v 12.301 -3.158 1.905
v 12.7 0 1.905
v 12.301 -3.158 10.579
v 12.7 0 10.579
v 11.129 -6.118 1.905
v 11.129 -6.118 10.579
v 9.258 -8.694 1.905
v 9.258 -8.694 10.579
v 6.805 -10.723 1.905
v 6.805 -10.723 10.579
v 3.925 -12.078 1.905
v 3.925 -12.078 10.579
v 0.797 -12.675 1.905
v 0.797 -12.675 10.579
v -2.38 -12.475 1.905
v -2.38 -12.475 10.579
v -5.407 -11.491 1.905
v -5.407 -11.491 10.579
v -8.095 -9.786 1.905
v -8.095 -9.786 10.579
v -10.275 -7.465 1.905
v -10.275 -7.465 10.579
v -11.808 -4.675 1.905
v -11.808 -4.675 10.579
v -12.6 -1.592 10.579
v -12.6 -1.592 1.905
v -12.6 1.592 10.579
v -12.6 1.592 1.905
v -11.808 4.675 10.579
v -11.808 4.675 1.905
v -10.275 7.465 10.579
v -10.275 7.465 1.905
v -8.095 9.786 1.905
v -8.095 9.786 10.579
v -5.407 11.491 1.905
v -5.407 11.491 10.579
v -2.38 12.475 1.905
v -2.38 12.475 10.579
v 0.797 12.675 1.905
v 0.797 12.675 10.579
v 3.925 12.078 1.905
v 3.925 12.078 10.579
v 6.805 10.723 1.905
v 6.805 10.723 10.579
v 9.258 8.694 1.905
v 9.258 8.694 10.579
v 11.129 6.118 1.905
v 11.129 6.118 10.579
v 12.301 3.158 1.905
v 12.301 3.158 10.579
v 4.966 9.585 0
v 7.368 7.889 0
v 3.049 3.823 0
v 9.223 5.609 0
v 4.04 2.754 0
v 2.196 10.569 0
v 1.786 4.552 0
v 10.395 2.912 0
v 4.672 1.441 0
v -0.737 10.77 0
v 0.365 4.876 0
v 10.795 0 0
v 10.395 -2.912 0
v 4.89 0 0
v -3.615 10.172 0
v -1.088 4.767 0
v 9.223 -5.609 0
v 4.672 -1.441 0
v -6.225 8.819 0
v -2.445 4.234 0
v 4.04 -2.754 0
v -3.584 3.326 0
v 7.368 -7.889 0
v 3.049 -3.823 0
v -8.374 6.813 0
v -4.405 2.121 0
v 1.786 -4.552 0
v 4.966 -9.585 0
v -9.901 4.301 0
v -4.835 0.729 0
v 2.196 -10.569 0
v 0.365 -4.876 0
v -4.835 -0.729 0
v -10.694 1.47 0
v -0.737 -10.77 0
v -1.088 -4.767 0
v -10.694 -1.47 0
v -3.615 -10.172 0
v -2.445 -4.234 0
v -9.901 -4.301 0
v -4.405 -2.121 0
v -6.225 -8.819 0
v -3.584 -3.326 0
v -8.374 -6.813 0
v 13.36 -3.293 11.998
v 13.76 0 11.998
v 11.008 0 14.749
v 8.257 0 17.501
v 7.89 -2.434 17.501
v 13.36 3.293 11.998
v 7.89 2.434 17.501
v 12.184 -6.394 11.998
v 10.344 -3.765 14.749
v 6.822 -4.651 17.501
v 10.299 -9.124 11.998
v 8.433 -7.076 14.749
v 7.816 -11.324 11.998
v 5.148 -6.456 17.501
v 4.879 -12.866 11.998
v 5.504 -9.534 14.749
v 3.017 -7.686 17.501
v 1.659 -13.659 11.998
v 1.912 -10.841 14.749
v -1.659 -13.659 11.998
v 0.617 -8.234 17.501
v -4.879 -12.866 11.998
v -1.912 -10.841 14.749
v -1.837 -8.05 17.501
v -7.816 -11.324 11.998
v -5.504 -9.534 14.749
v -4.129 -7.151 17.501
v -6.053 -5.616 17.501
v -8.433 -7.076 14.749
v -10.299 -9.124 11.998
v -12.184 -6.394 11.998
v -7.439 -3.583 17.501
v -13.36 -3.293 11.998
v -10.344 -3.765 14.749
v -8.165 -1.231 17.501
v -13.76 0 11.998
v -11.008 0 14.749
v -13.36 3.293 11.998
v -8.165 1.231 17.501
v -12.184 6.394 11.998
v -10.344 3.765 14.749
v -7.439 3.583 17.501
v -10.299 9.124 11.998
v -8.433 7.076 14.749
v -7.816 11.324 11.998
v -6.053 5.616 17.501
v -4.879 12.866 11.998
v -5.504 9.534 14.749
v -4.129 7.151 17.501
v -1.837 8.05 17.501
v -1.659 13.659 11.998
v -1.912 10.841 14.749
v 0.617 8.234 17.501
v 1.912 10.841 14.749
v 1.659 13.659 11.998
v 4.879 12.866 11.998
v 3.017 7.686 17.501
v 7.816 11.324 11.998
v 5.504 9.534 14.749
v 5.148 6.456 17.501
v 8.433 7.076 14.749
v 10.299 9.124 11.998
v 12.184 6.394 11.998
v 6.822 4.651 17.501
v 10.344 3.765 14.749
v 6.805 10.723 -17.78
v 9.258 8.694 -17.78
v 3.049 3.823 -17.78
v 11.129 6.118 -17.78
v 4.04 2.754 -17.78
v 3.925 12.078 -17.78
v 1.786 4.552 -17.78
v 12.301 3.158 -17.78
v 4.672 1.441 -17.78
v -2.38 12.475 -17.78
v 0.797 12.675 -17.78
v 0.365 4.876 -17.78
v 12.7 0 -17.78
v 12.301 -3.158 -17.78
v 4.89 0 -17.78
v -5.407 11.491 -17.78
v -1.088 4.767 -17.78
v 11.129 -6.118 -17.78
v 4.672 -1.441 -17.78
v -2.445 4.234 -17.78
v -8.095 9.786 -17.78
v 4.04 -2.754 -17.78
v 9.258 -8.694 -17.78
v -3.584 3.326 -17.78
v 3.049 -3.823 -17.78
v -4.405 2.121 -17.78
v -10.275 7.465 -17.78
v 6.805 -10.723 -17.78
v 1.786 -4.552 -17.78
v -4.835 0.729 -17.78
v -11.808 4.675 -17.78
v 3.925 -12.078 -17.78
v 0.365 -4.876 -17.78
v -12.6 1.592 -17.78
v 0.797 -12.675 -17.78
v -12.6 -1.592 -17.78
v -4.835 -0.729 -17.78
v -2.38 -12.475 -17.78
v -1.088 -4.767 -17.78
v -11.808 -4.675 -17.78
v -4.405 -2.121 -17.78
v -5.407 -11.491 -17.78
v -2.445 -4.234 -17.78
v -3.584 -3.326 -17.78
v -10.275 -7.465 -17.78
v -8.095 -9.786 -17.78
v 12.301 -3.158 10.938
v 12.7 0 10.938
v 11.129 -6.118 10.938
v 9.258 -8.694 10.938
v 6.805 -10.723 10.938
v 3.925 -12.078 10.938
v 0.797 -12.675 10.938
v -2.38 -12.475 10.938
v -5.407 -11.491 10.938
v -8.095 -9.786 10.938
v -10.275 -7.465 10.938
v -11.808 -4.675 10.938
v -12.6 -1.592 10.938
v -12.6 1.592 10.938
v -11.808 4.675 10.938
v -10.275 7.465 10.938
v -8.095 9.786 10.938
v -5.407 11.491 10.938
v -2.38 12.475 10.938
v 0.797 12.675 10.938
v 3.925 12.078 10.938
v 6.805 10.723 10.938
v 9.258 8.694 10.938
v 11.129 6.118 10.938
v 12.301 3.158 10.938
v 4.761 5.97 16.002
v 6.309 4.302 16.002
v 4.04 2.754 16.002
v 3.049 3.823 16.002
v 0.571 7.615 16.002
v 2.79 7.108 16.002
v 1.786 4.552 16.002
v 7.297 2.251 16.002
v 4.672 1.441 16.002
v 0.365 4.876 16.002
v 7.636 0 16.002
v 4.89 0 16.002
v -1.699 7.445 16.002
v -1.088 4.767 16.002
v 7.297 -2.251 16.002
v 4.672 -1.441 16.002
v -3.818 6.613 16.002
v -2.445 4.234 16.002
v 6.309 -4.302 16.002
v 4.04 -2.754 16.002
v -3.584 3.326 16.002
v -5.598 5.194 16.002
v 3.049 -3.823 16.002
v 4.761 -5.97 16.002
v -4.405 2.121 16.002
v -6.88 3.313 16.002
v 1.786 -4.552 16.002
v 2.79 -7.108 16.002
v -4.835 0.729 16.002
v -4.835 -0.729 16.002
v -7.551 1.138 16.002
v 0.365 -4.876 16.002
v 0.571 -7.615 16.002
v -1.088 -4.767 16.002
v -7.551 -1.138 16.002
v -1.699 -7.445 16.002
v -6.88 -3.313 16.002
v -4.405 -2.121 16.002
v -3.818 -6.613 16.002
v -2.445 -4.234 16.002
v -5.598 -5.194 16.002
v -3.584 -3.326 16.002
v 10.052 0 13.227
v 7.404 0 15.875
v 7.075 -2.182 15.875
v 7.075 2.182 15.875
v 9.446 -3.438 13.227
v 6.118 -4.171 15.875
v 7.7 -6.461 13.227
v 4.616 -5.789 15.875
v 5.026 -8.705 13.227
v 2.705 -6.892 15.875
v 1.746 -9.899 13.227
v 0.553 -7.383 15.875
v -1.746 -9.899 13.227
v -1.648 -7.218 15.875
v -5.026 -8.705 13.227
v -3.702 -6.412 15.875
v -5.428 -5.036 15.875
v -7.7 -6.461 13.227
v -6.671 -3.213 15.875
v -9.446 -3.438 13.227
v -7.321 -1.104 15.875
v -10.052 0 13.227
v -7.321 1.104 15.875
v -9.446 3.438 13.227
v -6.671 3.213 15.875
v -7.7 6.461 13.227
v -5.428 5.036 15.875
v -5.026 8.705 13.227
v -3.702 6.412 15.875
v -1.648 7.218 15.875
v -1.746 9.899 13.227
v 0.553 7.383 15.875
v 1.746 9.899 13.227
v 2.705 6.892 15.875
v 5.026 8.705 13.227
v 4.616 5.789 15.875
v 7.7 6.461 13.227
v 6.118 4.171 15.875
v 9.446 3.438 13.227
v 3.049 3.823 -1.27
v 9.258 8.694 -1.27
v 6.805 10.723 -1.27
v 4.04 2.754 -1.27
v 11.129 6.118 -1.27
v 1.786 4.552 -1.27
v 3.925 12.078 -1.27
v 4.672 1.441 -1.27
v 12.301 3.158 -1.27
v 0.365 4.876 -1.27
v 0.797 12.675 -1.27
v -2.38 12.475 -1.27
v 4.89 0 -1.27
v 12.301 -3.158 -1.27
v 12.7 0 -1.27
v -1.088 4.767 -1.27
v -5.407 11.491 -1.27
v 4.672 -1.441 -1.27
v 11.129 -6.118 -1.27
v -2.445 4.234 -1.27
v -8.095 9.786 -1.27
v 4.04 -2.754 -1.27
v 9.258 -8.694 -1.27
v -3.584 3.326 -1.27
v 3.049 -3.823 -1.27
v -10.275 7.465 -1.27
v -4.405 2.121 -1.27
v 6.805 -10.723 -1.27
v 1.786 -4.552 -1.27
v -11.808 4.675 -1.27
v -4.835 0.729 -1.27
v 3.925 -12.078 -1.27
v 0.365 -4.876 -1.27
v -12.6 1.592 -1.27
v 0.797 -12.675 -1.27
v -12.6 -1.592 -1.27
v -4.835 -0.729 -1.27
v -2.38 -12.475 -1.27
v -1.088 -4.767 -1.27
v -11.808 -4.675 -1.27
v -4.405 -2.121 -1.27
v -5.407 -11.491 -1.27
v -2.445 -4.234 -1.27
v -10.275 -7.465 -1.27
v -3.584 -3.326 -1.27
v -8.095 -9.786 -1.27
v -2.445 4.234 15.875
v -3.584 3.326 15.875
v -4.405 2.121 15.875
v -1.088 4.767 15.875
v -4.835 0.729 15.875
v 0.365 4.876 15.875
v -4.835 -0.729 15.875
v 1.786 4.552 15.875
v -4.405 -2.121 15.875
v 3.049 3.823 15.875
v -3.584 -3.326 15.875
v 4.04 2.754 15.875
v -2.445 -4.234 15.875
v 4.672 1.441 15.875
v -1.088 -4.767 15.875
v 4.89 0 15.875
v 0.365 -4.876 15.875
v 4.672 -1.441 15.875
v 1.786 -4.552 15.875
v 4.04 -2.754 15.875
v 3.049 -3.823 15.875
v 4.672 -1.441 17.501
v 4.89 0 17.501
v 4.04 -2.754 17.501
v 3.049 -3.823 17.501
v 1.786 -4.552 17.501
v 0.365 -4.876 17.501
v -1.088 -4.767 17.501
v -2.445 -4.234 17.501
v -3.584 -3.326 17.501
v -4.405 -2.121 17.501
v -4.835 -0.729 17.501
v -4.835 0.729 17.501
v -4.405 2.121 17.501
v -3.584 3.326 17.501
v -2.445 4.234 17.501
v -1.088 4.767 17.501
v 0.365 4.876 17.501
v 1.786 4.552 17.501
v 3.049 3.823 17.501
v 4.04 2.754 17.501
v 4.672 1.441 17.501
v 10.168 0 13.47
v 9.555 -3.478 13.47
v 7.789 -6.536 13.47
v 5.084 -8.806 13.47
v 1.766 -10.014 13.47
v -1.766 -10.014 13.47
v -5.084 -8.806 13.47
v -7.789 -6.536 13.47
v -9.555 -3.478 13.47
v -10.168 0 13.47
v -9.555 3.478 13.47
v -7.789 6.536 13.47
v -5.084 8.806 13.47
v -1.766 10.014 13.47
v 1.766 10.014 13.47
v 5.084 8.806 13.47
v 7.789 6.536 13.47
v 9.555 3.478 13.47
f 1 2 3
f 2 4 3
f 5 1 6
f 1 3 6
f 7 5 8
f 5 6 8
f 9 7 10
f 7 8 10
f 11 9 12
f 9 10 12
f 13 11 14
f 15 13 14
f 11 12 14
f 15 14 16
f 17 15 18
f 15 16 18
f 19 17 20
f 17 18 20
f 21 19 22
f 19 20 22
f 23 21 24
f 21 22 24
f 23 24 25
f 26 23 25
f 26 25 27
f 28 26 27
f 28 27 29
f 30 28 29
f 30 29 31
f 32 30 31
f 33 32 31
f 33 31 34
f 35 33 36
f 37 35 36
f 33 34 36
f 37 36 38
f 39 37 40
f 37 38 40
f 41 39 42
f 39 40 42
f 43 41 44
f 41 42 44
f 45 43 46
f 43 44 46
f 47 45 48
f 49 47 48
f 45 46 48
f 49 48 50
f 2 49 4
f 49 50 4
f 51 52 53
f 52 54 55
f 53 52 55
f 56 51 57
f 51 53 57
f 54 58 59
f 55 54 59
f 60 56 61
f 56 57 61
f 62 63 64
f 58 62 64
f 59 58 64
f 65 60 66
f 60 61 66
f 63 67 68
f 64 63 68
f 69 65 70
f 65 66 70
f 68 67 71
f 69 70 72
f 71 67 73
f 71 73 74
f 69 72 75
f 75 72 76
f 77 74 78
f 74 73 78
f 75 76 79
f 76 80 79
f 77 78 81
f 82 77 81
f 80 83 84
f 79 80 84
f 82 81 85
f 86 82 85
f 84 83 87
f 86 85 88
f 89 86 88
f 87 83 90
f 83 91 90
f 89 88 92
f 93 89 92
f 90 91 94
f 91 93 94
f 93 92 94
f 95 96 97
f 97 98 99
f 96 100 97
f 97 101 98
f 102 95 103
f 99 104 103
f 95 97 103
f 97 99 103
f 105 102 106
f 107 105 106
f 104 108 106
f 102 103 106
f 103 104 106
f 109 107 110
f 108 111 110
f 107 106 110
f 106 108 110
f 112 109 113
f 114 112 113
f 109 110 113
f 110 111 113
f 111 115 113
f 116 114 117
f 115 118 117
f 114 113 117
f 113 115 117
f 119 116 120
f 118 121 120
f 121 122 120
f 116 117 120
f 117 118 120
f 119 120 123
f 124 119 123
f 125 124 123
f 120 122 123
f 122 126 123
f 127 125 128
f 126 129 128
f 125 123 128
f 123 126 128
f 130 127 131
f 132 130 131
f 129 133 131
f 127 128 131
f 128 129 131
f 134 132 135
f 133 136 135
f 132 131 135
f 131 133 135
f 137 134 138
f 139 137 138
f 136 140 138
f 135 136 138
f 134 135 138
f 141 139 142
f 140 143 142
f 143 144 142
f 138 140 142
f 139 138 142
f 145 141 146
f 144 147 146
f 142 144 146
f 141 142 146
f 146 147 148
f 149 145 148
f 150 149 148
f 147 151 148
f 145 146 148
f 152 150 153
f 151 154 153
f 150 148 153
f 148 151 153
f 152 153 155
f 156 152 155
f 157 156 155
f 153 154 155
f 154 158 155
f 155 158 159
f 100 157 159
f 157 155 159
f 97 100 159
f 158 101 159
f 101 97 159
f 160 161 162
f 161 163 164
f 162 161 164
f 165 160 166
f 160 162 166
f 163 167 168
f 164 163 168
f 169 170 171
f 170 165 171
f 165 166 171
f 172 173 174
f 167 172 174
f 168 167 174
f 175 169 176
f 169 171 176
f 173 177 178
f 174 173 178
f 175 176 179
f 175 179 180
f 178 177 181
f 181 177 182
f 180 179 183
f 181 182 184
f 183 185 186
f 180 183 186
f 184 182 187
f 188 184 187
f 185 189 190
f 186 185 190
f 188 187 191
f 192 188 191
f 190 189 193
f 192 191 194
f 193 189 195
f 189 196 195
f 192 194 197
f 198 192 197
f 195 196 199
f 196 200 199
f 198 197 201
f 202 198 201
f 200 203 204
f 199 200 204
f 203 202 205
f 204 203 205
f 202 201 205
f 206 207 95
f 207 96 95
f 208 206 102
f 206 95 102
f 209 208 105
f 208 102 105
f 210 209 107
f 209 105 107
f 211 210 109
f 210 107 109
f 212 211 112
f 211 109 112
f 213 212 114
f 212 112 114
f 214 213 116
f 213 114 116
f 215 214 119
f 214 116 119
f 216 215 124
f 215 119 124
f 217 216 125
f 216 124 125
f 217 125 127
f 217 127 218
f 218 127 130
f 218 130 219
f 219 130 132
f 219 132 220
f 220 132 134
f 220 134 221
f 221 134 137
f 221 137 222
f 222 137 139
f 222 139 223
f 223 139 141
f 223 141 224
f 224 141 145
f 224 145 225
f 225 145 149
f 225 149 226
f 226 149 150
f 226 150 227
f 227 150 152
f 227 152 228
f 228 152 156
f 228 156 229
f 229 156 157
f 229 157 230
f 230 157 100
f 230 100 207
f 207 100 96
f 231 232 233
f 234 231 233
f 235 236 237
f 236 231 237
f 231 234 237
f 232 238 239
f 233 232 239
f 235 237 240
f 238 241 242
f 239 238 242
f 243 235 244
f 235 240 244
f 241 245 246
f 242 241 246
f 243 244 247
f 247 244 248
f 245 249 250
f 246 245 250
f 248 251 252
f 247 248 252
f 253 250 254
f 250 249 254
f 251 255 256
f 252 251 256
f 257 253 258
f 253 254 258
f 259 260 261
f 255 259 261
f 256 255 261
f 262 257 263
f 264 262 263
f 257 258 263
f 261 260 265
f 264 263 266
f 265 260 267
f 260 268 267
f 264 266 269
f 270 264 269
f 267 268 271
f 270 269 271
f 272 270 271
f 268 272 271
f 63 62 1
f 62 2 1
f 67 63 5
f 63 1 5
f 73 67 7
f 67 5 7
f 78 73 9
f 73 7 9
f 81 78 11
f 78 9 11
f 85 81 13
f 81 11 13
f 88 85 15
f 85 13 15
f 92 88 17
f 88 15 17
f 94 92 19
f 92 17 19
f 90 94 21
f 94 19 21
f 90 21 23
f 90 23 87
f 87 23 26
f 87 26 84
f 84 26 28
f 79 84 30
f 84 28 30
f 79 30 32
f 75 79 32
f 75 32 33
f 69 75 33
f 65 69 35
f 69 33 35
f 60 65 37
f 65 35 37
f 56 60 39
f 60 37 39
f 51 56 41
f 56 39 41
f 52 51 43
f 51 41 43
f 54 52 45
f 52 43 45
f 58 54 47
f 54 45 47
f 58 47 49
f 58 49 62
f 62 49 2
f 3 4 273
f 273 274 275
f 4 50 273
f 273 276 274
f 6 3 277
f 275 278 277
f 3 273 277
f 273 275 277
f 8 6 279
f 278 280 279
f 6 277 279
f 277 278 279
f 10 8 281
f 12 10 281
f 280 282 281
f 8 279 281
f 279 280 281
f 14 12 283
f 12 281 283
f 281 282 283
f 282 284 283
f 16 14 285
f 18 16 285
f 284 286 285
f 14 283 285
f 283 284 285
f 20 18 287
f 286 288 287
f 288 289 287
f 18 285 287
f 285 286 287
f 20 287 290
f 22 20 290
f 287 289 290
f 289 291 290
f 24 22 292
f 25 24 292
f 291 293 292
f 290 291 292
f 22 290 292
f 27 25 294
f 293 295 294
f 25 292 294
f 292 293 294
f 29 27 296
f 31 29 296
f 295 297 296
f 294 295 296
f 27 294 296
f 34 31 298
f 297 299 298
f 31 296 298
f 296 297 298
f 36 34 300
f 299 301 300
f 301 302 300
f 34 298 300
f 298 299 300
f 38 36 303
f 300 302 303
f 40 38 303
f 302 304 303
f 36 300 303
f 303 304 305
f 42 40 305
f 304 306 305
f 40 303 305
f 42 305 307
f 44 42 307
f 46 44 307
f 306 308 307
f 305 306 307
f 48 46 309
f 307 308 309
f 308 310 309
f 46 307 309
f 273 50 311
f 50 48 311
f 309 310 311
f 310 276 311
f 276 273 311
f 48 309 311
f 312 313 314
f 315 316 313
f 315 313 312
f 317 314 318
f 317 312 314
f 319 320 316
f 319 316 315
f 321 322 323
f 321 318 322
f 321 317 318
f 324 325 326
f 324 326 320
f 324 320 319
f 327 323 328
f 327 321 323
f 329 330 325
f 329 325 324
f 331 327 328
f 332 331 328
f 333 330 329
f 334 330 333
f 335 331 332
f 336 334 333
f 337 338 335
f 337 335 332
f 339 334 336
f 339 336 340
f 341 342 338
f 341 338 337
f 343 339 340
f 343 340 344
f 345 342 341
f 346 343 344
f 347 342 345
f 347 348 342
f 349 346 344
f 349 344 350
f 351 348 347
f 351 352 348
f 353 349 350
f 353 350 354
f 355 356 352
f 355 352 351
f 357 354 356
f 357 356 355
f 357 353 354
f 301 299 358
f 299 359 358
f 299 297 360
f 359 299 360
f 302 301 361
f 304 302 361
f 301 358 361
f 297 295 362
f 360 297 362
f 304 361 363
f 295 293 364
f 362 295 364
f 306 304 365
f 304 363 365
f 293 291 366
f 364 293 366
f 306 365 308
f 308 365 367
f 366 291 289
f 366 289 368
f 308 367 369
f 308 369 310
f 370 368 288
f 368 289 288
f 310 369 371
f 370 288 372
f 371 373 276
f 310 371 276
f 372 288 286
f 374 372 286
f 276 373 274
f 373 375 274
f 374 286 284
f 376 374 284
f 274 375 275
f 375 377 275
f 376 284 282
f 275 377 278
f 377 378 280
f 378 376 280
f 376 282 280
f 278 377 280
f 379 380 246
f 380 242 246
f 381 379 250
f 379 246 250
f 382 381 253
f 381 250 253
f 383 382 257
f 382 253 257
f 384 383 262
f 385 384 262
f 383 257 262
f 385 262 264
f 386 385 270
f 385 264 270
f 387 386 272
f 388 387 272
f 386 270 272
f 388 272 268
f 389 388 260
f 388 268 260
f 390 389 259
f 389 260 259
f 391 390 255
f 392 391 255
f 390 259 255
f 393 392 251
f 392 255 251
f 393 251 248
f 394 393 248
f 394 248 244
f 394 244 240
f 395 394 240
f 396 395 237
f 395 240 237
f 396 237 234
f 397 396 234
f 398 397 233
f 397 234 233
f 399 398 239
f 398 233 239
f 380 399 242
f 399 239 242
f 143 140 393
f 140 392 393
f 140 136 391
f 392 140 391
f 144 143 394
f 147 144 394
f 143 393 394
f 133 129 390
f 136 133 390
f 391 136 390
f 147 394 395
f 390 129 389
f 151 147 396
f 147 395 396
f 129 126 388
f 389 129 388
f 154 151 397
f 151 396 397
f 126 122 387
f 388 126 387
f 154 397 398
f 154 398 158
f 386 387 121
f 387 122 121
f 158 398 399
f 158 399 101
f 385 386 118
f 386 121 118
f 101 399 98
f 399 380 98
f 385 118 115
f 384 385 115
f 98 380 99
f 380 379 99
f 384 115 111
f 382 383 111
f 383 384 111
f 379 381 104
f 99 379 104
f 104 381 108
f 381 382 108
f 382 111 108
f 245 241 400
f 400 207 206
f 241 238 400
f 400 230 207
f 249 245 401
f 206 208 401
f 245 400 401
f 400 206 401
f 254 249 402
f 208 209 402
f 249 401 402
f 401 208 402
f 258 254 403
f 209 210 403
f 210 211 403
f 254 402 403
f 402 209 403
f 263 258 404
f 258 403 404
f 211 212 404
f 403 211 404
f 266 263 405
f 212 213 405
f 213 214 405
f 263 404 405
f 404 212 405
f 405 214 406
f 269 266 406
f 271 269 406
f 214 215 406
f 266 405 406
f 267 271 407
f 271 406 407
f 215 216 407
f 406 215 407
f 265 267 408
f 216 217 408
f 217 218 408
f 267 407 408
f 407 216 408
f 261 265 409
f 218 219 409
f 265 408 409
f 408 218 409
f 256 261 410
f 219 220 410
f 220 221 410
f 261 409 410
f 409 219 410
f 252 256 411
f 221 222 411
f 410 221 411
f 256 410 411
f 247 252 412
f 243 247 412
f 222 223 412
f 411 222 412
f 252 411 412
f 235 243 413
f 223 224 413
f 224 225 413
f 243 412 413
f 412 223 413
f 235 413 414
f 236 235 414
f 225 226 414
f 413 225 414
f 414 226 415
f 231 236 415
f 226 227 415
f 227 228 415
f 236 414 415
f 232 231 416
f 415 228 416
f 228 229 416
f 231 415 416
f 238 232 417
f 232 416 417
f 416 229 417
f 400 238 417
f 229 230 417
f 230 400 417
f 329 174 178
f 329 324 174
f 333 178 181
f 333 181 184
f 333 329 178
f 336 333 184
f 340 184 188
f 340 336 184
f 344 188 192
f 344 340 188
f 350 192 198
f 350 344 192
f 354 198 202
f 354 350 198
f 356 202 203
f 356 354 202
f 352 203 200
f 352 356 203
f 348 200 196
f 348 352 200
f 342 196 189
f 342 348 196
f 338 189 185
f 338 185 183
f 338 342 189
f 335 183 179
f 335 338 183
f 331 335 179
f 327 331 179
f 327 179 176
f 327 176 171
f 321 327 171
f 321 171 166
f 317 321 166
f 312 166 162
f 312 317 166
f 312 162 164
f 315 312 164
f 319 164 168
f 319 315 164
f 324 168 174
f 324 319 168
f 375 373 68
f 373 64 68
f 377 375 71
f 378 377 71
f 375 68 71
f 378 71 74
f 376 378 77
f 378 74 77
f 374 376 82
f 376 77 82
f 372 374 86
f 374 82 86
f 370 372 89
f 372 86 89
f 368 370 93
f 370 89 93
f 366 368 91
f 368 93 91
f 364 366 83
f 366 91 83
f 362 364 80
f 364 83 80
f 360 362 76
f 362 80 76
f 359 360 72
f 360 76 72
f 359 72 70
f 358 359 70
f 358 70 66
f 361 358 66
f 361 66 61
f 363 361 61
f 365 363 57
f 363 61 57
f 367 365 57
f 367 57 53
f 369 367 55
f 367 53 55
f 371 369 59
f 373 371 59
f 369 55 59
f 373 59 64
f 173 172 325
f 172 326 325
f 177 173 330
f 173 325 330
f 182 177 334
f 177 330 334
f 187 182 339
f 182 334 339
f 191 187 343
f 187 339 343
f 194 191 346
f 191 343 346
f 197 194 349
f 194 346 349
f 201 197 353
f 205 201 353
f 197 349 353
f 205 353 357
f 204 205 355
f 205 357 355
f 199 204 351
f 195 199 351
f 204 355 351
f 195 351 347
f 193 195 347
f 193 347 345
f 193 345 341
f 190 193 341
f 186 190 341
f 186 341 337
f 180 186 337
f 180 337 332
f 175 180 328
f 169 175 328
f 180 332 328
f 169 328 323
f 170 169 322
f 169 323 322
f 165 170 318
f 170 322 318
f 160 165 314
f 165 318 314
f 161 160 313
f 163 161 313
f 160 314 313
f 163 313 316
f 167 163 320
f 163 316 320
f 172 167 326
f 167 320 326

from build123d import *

# Parameters (mm, degrees)
F0_W = 7.8105
F0_H = 16.51


with BuildPart() as f1:
    # F0 (on Front) → F1 (revolve)
    with BuildSketch(Plane.XZ):
        with Locations((8.79475, -9.525)):
            Rectangle(F0_W, F0_H)
        Polygon((4.8895, 0), (10.795, 0), (12.7, 1.905), (12.7, 10.579111), (7.404111, 15.875), (4.8895, 15.875), align=None)
        Polygon((7.636321, 16.002), (12.7, 10.938321), (13.75967, 11.997991), (8.257061, 17.5006), (4.8895, 17.5006), (4.8895, 16.002), align=None)
    revolve(axis=Axis((0, 0, -6.006607), (0, 0, -1)))


solid = f1.part
